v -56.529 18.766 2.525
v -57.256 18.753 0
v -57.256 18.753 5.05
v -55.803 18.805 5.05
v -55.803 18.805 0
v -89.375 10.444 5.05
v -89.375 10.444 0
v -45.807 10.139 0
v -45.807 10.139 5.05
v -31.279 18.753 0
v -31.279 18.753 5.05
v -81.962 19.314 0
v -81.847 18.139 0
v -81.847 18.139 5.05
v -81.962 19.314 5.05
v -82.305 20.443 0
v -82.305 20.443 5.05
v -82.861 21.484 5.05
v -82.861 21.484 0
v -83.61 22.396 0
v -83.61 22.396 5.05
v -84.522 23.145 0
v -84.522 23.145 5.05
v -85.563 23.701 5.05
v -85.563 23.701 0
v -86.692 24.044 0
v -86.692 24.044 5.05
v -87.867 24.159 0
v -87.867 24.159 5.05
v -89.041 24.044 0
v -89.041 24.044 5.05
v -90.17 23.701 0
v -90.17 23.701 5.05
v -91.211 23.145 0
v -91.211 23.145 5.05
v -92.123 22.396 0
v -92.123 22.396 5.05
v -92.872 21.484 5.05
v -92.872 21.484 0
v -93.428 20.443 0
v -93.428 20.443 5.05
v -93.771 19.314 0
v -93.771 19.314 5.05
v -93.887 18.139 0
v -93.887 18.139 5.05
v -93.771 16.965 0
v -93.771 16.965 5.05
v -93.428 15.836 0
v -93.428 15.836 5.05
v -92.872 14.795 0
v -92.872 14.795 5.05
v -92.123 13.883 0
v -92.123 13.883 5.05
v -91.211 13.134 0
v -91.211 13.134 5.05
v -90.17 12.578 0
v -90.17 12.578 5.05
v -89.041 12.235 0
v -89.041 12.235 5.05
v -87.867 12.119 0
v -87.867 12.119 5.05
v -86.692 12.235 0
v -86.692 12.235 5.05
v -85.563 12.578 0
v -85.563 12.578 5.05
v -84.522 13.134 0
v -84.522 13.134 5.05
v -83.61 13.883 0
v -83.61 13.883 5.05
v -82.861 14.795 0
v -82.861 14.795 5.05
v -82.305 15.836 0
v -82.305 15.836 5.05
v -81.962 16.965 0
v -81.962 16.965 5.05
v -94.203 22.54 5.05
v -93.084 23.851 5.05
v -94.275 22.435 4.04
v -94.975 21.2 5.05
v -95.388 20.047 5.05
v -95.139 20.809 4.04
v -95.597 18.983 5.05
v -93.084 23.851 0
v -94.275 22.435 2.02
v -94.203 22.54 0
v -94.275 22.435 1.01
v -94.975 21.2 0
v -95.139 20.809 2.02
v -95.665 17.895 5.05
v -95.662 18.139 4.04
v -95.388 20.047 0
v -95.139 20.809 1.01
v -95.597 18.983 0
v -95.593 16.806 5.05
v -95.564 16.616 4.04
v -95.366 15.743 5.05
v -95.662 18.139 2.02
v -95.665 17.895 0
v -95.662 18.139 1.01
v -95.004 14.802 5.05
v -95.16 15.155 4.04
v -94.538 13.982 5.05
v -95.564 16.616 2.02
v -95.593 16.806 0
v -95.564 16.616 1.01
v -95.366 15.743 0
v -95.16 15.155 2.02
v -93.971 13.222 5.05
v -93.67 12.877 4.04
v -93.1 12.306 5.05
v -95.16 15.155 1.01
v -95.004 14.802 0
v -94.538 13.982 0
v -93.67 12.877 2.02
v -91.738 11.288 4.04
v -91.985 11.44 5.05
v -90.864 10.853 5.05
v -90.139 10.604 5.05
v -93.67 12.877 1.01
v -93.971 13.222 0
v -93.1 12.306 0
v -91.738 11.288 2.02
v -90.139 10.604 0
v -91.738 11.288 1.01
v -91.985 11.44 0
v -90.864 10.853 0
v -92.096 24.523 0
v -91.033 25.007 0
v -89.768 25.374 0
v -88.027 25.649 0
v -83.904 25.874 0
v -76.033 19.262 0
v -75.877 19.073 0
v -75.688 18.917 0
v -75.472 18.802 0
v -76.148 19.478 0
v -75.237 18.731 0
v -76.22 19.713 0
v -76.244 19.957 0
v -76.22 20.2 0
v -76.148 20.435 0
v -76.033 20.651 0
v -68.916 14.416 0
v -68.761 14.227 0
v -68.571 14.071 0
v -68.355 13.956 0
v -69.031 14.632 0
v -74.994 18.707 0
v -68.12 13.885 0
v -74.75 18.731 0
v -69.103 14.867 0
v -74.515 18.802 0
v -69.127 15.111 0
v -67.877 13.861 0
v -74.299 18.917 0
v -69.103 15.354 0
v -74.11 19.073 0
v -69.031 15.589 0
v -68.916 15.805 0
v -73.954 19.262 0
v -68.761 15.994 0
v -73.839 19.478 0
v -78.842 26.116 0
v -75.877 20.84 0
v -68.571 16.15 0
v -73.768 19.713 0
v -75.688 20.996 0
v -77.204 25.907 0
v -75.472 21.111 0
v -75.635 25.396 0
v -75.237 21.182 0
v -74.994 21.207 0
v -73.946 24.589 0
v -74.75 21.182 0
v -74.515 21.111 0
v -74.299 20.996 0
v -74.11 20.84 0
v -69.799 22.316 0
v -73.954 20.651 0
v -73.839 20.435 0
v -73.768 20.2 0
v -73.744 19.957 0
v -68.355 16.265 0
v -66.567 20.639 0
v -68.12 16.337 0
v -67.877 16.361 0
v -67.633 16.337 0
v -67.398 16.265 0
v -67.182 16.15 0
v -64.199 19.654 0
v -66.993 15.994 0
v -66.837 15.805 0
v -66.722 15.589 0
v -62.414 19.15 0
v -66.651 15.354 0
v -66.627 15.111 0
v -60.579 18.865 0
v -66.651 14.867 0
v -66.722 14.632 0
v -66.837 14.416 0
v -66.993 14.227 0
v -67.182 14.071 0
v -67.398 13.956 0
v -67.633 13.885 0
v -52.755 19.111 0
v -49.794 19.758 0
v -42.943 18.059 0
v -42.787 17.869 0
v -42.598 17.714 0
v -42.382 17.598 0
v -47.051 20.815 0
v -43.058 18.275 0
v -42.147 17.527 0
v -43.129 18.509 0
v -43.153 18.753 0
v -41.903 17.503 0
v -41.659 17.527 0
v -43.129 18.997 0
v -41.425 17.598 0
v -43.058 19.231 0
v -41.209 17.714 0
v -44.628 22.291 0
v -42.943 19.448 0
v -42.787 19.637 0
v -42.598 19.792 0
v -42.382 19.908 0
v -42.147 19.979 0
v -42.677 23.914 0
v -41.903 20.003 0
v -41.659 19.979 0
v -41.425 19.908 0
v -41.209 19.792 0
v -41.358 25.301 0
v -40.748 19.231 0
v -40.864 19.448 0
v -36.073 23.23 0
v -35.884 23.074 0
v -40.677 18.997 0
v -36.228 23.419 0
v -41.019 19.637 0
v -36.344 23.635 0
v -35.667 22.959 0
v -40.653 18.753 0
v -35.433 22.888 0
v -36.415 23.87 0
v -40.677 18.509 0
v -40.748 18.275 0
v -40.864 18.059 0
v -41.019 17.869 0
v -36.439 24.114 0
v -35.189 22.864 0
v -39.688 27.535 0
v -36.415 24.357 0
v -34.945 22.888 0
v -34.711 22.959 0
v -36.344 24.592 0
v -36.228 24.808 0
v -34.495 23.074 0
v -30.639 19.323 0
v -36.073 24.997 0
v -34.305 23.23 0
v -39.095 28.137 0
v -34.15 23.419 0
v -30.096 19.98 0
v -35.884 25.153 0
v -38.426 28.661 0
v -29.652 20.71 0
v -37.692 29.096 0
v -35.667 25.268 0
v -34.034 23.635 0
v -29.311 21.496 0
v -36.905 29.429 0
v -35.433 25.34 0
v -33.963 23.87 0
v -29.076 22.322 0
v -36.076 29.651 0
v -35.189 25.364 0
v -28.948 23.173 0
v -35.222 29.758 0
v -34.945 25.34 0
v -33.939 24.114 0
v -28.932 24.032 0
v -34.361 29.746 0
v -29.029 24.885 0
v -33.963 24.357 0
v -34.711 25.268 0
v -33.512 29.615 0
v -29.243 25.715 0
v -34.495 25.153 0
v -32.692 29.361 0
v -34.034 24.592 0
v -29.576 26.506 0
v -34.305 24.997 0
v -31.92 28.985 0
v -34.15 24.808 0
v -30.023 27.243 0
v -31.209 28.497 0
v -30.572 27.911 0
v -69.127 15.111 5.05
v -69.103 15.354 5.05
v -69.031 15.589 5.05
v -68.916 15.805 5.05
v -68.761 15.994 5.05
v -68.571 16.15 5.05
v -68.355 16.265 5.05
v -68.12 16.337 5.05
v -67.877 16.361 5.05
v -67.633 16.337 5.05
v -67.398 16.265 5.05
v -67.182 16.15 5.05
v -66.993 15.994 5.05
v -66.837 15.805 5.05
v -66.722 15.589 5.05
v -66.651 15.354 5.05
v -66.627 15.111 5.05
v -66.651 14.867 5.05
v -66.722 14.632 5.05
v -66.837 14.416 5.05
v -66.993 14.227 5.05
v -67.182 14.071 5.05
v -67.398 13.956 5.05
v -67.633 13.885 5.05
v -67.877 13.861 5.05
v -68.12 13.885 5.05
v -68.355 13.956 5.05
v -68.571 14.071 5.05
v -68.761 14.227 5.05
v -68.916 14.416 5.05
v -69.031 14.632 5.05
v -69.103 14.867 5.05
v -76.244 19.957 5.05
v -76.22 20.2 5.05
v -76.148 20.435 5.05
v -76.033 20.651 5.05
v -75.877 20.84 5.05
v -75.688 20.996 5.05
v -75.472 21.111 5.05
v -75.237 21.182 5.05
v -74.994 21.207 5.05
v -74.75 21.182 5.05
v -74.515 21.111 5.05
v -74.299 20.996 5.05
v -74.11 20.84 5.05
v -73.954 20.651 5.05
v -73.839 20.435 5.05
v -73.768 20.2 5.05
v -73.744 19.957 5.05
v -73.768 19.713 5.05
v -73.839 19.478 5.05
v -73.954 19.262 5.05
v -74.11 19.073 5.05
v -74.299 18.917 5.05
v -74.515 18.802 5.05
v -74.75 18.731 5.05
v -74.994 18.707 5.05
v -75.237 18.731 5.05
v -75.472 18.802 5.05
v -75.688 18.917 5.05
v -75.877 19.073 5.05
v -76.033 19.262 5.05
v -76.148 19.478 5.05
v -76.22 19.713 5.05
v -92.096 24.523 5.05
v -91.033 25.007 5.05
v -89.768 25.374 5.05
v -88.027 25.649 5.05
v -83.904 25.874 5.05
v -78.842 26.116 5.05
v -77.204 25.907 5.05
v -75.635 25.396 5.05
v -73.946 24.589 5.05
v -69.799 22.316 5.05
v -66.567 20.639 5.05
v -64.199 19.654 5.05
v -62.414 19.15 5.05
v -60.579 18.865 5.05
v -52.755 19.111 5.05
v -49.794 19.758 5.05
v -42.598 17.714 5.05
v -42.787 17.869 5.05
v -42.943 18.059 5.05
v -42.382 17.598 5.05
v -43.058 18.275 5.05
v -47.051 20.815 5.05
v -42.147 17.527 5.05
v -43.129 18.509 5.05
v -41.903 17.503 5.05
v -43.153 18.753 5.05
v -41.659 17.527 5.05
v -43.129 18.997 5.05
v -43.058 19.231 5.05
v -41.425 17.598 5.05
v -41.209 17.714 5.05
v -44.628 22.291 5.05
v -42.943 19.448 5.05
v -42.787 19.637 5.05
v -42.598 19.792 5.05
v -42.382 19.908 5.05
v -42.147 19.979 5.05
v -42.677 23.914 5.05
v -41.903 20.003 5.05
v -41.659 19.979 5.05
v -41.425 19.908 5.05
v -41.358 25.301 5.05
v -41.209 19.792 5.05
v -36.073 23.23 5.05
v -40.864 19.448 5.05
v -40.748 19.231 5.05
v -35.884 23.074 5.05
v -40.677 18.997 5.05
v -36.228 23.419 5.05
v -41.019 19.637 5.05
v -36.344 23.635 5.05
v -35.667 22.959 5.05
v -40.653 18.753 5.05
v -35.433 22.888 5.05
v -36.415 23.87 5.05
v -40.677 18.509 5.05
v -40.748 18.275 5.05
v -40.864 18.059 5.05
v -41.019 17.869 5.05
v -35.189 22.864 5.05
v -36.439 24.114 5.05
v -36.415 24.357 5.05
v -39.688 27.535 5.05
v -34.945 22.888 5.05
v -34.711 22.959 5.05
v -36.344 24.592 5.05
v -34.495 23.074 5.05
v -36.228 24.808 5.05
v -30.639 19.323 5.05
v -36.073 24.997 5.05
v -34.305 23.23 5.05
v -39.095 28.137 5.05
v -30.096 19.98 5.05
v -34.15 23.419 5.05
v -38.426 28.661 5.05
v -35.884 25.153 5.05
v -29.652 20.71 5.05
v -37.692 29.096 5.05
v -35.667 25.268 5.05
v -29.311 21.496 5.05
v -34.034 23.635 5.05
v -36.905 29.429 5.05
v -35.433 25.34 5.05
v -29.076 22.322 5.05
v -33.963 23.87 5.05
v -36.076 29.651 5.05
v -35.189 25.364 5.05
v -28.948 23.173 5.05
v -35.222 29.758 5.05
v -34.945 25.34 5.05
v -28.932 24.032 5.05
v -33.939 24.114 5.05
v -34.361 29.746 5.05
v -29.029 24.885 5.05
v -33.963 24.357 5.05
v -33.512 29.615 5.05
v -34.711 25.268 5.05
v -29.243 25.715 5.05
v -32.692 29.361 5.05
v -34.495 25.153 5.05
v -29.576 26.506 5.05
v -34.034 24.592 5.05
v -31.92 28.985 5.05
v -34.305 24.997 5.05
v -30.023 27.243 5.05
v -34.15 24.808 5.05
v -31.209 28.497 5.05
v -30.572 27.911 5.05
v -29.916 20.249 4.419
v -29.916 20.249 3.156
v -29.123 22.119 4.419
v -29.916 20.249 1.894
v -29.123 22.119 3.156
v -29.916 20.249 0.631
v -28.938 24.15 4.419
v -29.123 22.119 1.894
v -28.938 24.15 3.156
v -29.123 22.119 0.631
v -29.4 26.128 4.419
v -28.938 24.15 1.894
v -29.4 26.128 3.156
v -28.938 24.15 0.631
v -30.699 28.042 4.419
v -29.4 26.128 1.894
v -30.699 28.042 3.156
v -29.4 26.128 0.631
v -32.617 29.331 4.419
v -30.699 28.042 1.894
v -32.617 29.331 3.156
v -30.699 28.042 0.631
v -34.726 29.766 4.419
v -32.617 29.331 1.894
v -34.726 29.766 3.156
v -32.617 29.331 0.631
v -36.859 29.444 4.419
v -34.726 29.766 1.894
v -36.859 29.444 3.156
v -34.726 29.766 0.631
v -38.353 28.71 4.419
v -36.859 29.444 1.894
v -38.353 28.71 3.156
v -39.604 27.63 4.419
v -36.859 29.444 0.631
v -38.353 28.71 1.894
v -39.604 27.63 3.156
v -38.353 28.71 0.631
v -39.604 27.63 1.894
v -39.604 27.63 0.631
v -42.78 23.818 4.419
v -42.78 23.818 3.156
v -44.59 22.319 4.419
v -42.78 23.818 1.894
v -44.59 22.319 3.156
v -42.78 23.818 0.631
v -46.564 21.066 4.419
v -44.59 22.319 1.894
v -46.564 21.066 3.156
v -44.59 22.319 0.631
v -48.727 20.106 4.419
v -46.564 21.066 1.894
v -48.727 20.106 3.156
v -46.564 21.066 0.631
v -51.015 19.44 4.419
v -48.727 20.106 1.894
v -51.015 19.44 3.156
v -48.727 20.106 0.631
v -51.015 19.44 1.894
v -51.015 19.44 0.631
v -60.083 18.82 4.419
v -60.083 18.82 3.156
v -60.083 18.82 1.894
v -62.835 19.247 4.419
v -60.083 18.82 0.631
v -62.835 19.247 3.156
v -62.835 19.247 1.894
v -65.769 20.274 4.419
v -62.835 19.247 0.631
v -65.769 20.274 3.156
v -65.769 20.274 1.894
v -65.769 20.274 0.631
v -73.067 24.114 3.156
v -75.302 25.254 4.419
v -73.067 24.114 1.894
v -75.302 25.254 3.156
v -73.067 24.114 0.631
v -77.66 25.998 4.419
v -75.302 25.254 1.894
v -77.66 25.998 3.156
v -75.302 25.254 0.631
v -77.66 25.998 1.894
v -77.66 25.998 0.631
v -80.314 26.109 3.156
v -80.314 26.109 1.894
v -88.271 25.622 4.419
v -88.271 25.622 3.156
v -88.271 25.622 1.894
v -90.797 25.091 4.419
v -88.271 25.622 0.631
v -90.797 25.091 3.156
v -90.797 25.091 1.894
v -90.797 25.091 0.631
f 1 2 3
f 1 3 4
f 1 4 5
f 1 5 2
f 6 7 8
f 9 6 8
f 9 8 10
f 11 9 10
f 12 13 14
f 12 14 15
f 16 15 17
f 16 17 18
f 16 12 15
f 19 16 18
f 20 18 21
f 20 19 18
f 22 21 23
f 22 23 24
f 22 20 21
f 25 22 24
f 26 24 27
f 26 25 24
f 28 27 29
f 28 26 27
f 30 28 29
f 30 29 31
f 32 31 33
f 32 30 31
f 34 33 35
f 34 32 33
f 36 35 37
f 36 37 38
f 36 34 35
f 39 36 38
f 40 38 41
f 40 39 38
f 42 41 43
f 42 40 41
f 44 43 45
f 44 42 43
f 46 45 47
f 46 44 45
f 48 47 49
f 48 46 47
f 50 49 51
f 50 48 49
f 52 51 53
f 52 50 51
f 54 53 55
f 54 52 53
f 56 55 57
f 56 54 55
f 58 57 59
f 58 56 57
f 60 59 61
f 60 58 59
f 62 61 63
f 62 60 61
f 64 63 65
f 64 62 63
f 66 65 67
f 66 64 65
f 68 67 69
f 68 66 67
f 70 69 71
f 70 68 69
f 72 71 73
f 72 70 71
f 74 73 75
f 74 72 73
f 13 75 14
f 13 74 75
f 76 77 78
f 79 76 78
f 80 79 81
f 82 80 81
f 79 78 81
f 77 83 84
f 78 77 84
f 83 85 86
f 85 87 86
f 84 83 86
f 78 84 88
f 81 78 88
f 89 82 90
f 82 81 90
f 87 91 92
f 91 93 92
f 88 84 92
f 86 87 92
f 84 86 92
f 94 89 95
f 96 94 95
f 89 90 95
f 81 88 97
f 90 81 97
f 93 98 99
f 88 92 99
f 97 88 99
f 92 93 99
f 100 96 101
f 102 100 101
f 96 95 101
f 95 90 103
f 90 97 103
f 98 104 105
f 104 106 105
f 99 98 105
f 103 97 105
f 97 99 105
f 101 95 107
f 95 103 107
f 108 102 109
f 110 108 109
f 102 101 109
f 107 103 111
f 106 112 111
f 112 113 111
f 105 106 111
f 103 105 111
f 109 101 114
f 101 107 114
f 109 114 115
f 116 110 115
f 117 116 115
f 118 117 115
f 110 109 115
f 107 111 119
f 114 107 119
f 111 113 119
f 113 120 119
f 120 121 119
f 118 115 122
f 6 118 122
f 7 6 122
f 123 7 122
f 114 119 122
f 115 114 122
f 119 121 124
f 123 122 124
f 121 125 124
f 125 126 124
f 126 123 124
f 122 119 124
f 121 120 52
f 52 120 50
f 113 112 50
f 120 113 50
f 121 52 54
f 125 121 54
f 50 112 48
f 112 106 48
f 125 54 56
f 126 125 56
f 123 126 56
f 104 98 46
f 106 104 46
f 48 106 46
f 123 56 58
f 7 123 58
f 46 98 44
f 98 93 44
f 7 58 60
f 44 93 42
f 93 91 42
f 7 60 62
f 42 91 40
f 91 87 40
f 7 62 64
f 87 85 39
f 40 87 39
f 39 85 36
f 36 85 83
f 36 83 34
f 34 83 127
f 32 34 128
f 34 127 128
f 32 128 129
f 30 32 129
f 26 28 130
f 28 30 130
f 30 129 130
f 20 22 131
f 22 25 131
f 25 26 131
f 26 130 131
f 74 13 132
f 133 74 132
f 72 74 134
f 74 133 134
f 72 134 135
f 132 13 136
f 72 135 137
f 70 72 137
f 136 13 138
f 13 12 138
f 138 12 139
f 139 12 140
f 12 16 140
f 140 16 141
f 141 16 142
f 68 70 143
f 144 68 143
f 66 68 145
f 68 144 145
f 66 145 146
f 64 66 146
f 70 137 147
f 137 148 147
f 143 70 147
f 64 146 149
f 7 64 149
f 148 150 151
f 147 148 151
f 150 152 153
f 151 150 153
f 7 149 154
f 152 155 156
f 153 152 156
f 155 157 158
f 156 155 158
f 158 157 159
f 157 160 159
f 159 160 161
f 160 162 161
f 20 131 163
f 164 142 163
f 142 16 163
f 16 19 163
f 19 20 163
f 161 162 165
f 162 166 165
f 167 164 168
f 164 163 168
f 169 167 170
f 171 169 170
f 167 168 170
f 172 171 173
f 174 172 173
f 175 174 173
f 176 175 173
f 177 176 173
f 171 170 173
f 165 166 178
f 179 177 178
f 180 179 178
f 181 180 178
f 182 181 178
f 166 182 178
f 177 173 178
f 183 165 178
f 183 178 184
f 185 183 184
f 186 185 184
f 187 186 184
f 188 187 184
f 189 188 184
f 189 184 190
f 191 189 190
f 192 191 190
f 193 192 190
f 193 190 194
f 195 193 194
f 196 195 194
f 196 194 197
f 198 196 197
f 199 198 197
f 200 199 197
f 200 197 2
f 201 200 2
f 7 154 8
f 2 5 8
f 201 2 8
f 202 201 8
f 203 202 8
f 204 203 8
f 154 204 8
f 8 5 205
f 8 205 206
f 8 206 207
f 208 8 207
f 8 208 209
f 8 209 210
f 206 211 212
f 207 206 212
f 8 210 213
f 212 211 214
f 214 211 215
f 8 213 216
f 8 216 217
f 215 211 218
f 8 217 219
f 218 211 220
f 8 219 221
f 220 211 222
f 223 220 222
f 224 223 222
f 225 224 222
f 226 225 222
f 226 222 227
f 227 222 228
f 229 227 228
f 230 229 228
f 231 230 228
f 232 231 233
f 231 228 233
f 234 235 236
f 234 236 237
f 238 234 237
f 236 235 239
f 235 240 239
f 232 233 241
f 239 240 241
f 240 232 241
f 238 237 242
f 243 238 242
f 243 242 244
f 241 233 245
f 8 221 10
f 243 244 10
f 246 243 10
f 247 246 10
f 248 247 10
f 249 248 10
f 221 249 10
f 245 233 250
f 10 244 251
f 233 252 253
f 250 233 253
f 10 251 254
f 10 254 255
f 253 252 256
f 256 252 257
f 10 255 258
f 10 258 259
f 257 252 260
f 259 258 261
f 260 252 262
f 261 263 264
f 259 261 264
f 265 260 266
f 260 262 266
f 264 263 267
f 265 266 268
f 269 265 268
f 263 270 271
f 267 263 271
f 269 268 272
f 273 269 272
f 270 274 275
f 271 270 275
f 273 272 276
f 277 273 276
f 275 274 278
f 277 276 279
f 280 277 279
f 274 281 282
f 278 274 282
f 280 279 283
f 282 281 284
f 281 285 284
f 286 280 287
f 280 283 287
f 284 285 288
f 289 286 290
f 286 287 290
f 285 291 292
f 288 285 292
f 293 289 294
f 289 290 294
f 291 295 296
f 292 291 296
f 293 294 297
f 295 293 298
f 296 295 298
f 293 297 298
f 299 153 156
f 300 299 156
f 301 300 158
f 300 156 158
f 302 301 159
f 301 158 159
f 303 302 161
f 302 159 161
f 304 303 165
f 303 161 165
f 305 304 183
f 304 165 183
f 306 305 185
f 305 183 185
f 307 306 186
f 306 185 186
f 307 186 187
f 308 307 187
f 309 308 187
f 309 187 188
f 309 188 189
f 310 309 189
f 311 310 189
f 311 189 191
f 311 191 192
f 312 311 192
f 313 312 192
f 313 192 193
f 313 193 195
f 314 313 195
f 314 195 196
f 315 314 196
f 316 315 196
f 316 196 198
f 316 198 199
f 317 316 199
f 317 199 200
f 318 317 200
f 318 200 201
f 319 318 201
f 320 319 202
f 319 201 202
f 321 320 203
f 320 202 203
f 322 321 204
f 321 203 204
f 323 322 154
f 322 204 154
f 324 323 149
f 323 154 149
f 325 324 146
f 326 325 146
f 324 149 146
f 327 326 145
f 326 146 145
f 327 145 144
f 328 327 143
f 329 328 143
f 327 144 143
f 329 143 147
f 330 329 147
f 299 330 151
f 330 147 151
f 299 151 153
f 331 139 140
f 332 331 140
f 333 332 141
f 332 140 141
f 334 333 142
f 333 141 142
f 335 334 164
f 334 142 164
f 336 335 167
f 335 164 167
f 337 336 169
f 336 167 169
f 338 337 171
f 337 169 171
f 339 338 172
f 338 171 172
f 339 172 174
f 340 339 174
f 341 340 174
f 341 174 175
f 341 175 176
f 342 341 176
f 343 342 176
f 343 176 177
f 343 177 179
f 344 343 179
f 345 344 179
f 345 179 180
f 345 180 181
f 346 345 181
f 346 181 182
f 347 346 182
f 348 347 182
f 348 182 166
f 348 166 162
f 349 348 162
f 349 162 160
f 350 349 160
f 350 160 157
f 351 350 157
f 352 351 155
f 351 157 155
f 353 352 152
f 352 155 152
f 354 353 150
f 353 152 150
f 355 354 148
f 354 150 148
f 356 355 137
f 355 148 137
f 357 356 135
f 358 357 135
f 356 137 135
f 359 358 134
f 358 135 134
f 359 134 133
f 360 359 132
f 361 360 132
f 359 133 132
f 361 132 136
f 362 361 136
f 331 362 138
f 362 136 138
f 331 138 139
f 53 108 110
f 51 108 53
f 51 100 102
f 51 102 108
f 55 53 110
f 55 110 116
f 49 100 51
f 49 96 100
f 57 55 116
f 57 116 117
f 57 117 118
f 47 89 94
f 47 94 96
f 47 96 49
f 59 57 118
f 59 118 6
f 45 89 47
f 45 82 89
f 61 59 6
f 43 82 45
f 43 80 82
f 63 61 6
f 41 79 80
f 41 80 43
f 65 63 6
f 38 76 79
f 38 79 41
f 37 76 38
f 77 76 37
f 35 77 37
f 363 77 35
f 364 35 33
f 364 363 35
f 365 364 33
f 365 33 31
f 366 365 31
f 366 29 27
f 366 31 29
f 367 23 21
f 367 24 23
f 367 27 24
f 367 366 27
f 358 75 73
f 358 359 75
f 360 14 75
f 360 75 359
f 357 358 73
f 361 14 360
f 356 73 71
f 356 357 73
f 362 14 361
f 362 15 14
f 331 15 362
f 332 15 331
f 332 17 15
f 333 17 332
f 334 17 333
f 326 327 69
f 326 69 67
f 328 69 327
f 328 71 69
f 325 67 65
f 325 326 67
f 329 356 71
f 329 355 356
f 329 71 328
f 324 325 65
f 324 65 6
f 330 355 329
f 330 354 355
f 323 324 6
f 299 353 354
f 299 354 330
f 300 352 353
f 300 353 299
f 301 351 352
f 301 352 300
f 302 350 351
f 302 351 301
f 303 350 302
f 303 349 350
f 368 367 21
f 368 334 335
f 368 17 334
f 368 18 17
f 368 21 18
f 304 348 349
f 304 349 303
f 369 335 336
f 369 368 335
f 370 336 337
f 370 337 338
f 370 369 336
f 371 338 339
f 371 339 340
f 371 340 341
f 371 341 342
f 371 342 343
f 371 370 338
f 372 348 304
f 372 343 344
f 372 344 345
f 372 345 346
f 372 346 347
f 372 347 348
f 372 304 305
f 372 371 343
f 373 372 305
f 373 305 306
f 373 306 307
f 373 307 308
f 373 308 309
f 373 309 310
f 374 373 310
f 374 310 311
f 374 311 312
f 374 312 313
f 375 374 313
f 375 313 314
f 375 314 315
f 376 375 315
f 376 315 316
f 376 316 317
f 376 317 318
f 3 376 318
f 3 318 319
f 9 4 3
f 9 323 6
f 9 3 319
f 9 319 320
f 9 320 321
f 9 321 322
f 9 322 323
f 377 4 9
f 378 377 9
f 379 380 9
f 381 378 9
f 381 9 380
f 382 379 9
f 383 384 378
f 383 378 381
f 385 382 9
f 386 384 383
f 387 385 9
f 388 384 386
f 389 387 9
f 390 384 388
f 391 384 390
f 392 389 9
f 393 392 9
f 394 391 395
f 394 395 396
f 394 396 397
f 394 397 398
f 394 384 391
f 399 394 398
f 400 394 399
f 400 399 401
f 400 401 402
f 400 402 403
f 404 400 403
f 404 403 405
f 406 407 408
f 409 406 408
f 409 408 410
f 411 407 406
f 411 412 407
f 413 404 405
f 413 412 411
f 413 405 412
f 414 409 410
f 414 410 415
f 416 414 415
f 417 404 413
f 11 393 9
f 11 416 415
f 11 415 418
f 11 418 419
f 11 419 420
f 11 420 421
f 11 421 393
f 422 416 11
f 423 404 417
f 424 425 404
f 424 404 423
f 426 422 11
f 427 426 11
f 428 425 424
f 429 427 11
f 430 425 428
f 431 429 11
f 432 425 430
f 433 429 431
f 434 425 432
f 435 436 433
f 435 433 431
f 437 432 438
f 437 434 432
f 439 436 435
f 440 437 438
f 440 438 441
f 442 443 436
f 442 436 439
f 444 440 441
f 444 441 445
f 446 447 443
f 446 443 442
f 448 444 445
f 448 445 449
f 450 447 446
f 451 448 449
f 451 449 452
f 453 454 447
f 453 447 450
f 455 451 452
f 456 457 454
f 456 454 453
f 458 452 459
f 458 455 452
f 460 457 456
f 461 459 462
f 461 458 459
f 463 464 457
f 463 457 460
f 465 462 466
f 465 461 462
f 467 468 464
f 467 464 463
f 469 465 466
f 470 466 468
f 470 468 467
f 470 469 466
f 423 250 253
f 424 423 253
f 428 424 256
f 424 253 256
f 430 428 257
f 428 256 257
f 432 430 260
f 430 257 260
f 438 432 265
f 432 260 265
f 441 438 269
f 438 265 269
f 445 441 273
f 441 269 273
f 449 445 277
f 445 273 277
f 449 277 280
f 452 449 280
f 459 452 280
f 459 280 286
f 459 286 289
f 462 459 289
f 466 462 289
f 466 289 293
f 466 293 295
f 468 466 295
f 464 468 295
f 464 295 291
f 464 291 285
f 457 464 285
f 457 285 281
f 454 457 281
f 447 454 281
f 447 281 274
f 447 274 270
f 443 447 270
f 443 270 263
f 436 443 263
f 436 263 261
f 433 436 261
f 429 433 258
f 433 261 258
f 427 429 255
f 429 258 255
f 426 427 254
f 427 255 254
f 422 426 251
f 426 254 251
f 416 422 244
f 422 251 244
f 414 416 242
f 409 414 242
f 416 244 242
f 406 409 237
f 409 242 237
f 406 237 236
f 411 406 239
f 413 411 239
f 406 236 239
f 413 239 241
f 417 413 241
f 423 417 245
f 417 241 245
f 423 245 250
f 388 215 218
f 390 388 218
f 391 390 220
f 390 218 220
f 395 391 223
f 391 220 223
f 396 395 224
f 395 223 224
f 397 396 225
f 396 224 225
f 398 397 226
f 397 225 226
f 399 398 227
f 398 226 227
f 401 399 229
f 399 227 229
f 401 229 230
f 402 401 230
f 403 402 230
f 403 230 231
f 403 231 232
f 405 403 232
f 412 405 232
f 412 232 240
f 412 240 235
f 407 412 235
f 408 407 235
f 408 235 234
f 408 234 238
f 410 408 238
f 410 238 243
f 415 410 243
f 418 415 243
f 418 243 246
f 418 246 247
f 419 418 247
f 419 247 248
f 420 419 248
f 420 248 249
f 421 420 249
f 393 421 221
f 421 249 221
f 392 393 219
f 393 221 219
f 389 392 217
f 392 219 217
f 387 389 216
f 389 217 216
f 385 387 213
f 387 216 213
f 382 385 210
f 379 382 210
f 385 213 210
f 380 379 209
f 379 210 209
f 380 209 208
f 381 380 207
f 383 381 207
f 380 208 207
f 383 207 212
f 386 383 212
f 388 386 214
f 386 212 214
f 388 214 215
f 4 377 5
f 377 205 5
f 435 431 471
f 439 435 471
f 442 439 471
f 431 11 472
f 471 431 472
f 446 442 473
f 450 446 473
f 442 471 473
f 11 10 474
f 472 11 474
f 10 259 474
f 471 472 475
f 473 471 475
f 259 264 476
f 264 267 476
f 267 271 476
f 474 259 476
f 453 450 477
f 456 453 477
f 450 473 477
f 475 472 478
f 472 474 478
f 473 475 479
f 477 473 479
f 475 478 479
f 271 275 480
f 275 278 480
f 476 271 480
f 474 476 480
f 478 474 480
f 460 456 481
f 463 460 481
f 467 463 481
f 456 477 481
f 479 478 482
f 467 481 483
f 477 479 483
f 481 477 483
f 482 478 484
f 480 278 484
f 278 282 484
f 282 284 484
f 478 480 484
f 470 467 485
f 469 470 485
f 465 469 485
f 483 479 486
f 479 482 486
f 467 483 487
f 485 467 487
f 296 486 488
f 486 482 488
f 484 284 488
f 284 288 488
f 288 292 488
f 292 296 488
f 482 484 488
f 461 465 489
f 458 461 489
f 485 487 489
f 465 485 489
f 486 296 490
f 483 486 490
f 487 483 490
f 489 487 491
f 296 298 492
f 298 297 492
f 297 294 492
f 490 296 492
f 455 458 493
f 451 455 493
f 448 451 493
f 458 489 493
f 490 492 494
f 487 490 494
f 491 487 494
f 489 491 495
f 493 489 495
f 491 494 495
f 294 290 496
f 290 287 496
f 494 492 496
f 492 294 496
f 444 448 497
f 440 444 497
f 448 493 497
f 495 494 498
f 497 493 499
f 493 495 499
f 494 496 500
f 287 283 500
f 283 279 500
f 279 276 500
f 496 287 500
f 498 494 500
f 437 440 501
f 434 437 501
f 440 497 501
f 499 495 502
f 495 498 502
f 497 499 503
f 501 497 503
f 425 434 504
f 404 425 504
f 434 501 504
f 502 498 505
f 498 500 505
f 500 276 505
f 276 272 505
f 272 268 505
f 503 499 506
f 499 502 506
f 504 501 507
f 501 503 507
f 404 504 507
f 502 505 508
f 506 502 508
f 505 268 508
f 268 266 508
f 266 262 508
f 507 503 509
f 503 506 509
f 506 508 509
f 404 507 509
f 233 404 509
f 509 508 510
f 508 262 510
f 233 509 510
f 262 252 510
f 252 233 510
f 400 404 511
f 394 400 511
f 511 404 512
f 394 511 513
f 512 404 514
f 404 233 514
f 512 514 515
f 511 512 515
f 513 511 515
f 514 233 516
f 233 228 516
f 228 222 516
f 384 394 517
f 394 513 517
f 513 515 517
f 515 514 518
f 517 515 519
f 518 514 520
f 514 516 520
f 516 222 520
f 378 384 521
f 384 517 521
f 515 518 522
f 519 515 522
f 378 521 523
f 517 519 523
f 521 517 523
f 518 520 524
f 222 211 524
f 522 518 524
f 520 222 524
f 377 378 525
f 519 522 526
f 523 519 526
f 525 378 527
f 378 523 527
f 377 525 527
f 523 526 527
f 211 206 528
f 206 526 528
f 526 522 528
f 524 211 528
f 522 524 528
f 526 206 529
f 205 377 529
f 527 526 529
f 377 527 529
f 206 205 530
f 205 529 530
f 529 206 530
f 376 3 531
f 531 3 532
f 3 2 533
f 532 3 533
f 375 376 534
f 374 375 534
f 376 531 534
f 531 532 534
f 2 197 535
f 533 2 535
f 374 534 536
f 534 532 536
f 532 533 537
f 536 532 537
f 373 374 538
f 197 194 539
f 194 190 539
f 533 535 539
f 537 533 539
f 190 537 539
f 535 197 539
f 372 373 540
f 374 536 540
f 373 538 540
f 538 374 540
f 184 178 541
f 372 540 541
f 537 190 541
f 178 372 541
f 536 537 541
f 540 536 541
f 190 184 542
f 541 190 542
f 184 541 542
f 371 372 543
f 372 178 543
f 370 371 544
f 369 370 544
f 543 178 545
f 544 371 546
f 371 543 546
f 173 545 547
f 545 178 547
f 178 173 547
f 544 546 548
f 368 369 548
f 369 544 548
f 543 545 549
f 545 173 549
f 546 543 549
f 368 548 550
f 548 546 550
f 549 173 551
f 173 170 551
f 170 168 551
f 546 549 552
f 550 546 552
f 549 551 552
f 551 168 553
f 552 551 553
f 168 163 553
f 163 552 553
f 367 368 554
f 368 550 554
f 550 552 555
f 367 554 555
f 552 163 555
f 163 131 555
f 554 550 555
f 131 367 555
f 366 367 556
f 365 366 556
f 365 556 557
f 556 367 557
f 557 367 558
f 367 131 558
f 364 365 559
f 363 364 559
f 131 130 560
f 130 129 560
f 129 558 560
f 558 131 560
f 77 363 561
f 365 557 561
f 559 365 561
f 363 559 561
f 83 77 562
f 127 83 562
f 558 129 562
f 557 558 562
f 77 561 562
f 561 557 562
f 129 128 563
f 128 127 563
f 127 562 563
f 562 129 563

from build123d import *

# Parameters (mm, degrees)
SCHIZZO2_R                   = 6.02
SCHIZZO2_R_2                 = 1.7
ESTRUSIONE_ESTRUSIONE1_DEPTH = 5.05
FORO_FILETTATO_M3X0_5_1_D    = 2.5


with BuildPart() as part:
    # Schizzo2 → Estrusione-Estrusione1 (new body)
    # profile 1 of 3: a face of its own
    with BuildSketch(Plane.XY):
        with BuildLine():
            Line((-89.374898214, 10.44391596), (-45.806517375, 10.138527109))
            Line((-45.806517375, 10.138527109), (-31.279343931, 18.753125585))
            add(Edge.make_bspline(
                [(-31.279343931, 18.753125585), (-29.098043345, 20.403651058), (-27.905057256, 25.441624833), (-32.300384053, 29.85841163), (-36.690541673, 29.918863446), (-39.614892883, 27.942376602), (-41.03245157, 25.552100431), (-43.284640457, 23.241638673), (-47.763557065, 19.862154048), (-52.57074608, 18.979169365), (-55.803154975, 18.8049533)],
                knots=[0, 0, 0, 0, 0.102244465, 0.160154236, 0.214292787, 0.256272844, 0.289149591, 0.319658417, 0.379342086, 0.500706378, 0.500706378, 0.500706378, 0.500706378], degree=3))
            add(Edge.make_bspline(
                [(-57.25626525, 18.753125585), (-56.52869344, 18.753125585), (-55.803154975, 18.8049533)],
                knots=[4.71238898, 4.71238898, 4.71238898, 4.787168695, 4.787168695, 4.787168695], degree=2, weights=[1, 0.999301081, 1]))
            add(Edge.make_bspline(
                [(-57.25626525, 18.753125585), (-59.155150134, 18.717879159), (-63.127762505, 18.895973961), (-68.30110331, 21.45743798), (-72.985617709, 24.08656858), (-76.315266746, 25.875128424), (-79.739526403, 26.236715977), (-83.278928702, 25.795001813), (-88.238817678, 25.8484339), (-91.689171987, 24.998953947), (-93.083744843, 23.851210505)],
                knots=[0.518902231, 0.518902231, 0.518902231, 0.518902231, 0.590344576, 0.669858142, 0.735080639, 0.798411316, 0.810363017, 0.866325434, 0.934003559, 1, 1, 1, 1], degree=3))
            add(Edge.make_bspline(
                [(-93.083744843, 23.851210505), (-93.963586918, 22.989018523), (-95.239548576, 21.18289576), (-95.824246169, 18.047120823), (-95.406173905, 15.162358675), (-93.315245164, 12.148204862), (-91.089335339, 10.692555949), (-89.374898214, 10.44391596)],
                knots=[0.80240839, 0.80240839, 0.80240839, 0.80240839, 0.844688232, 0.876032892, 0.910905343, 0.942275004, 1, 1, 1, 1], degree=3))
        make_face()
        with Locations((-87.866678473, 18.139302594)):
            Circle(SCHIZZO2_R, mode=Mode.SUBTRACT)
        with Locations((-74.993560801, 19.956508848)):
            Circle(SCHIZZO2_R_2, mode=Mode.SUBTRACT)
        with Locations((-35.18906777, 24.113568479)):
            Circle(SCHIZZO2_R_2, mode=Mode.SUBTRACT)
    # profile 2 of 3: a face of its own
    with BuildSketch(Plane.XY):
        with Locations((-74.993560801, 19.956508848)):
            Circle(SCHIZZO2_R_2)
    # profile 3 of 3: a face of its own
    with BuildSketch(Plane.XY):
        with Locations((-35.18906777, 24.113568479)):
            Circle(SCHIZZO2_R_2)
    extrude(amount=ESTRUSIONE_ESTRUSIONE1_DEPTH)

    # Foro filettato M3x0.5-1 (through all)
    with Locations(Plane.XY.offset(5.05)):
        with Locations((-67.876621075, 15.110612874), (-74.993560801, 19.956508848), (-41.903191958, 18.753125585), (-35.18906777, 24.113568479)):
            Hole(FORO_FILETTATO_M3X0_5_1_D / 2)


solid = part.part
